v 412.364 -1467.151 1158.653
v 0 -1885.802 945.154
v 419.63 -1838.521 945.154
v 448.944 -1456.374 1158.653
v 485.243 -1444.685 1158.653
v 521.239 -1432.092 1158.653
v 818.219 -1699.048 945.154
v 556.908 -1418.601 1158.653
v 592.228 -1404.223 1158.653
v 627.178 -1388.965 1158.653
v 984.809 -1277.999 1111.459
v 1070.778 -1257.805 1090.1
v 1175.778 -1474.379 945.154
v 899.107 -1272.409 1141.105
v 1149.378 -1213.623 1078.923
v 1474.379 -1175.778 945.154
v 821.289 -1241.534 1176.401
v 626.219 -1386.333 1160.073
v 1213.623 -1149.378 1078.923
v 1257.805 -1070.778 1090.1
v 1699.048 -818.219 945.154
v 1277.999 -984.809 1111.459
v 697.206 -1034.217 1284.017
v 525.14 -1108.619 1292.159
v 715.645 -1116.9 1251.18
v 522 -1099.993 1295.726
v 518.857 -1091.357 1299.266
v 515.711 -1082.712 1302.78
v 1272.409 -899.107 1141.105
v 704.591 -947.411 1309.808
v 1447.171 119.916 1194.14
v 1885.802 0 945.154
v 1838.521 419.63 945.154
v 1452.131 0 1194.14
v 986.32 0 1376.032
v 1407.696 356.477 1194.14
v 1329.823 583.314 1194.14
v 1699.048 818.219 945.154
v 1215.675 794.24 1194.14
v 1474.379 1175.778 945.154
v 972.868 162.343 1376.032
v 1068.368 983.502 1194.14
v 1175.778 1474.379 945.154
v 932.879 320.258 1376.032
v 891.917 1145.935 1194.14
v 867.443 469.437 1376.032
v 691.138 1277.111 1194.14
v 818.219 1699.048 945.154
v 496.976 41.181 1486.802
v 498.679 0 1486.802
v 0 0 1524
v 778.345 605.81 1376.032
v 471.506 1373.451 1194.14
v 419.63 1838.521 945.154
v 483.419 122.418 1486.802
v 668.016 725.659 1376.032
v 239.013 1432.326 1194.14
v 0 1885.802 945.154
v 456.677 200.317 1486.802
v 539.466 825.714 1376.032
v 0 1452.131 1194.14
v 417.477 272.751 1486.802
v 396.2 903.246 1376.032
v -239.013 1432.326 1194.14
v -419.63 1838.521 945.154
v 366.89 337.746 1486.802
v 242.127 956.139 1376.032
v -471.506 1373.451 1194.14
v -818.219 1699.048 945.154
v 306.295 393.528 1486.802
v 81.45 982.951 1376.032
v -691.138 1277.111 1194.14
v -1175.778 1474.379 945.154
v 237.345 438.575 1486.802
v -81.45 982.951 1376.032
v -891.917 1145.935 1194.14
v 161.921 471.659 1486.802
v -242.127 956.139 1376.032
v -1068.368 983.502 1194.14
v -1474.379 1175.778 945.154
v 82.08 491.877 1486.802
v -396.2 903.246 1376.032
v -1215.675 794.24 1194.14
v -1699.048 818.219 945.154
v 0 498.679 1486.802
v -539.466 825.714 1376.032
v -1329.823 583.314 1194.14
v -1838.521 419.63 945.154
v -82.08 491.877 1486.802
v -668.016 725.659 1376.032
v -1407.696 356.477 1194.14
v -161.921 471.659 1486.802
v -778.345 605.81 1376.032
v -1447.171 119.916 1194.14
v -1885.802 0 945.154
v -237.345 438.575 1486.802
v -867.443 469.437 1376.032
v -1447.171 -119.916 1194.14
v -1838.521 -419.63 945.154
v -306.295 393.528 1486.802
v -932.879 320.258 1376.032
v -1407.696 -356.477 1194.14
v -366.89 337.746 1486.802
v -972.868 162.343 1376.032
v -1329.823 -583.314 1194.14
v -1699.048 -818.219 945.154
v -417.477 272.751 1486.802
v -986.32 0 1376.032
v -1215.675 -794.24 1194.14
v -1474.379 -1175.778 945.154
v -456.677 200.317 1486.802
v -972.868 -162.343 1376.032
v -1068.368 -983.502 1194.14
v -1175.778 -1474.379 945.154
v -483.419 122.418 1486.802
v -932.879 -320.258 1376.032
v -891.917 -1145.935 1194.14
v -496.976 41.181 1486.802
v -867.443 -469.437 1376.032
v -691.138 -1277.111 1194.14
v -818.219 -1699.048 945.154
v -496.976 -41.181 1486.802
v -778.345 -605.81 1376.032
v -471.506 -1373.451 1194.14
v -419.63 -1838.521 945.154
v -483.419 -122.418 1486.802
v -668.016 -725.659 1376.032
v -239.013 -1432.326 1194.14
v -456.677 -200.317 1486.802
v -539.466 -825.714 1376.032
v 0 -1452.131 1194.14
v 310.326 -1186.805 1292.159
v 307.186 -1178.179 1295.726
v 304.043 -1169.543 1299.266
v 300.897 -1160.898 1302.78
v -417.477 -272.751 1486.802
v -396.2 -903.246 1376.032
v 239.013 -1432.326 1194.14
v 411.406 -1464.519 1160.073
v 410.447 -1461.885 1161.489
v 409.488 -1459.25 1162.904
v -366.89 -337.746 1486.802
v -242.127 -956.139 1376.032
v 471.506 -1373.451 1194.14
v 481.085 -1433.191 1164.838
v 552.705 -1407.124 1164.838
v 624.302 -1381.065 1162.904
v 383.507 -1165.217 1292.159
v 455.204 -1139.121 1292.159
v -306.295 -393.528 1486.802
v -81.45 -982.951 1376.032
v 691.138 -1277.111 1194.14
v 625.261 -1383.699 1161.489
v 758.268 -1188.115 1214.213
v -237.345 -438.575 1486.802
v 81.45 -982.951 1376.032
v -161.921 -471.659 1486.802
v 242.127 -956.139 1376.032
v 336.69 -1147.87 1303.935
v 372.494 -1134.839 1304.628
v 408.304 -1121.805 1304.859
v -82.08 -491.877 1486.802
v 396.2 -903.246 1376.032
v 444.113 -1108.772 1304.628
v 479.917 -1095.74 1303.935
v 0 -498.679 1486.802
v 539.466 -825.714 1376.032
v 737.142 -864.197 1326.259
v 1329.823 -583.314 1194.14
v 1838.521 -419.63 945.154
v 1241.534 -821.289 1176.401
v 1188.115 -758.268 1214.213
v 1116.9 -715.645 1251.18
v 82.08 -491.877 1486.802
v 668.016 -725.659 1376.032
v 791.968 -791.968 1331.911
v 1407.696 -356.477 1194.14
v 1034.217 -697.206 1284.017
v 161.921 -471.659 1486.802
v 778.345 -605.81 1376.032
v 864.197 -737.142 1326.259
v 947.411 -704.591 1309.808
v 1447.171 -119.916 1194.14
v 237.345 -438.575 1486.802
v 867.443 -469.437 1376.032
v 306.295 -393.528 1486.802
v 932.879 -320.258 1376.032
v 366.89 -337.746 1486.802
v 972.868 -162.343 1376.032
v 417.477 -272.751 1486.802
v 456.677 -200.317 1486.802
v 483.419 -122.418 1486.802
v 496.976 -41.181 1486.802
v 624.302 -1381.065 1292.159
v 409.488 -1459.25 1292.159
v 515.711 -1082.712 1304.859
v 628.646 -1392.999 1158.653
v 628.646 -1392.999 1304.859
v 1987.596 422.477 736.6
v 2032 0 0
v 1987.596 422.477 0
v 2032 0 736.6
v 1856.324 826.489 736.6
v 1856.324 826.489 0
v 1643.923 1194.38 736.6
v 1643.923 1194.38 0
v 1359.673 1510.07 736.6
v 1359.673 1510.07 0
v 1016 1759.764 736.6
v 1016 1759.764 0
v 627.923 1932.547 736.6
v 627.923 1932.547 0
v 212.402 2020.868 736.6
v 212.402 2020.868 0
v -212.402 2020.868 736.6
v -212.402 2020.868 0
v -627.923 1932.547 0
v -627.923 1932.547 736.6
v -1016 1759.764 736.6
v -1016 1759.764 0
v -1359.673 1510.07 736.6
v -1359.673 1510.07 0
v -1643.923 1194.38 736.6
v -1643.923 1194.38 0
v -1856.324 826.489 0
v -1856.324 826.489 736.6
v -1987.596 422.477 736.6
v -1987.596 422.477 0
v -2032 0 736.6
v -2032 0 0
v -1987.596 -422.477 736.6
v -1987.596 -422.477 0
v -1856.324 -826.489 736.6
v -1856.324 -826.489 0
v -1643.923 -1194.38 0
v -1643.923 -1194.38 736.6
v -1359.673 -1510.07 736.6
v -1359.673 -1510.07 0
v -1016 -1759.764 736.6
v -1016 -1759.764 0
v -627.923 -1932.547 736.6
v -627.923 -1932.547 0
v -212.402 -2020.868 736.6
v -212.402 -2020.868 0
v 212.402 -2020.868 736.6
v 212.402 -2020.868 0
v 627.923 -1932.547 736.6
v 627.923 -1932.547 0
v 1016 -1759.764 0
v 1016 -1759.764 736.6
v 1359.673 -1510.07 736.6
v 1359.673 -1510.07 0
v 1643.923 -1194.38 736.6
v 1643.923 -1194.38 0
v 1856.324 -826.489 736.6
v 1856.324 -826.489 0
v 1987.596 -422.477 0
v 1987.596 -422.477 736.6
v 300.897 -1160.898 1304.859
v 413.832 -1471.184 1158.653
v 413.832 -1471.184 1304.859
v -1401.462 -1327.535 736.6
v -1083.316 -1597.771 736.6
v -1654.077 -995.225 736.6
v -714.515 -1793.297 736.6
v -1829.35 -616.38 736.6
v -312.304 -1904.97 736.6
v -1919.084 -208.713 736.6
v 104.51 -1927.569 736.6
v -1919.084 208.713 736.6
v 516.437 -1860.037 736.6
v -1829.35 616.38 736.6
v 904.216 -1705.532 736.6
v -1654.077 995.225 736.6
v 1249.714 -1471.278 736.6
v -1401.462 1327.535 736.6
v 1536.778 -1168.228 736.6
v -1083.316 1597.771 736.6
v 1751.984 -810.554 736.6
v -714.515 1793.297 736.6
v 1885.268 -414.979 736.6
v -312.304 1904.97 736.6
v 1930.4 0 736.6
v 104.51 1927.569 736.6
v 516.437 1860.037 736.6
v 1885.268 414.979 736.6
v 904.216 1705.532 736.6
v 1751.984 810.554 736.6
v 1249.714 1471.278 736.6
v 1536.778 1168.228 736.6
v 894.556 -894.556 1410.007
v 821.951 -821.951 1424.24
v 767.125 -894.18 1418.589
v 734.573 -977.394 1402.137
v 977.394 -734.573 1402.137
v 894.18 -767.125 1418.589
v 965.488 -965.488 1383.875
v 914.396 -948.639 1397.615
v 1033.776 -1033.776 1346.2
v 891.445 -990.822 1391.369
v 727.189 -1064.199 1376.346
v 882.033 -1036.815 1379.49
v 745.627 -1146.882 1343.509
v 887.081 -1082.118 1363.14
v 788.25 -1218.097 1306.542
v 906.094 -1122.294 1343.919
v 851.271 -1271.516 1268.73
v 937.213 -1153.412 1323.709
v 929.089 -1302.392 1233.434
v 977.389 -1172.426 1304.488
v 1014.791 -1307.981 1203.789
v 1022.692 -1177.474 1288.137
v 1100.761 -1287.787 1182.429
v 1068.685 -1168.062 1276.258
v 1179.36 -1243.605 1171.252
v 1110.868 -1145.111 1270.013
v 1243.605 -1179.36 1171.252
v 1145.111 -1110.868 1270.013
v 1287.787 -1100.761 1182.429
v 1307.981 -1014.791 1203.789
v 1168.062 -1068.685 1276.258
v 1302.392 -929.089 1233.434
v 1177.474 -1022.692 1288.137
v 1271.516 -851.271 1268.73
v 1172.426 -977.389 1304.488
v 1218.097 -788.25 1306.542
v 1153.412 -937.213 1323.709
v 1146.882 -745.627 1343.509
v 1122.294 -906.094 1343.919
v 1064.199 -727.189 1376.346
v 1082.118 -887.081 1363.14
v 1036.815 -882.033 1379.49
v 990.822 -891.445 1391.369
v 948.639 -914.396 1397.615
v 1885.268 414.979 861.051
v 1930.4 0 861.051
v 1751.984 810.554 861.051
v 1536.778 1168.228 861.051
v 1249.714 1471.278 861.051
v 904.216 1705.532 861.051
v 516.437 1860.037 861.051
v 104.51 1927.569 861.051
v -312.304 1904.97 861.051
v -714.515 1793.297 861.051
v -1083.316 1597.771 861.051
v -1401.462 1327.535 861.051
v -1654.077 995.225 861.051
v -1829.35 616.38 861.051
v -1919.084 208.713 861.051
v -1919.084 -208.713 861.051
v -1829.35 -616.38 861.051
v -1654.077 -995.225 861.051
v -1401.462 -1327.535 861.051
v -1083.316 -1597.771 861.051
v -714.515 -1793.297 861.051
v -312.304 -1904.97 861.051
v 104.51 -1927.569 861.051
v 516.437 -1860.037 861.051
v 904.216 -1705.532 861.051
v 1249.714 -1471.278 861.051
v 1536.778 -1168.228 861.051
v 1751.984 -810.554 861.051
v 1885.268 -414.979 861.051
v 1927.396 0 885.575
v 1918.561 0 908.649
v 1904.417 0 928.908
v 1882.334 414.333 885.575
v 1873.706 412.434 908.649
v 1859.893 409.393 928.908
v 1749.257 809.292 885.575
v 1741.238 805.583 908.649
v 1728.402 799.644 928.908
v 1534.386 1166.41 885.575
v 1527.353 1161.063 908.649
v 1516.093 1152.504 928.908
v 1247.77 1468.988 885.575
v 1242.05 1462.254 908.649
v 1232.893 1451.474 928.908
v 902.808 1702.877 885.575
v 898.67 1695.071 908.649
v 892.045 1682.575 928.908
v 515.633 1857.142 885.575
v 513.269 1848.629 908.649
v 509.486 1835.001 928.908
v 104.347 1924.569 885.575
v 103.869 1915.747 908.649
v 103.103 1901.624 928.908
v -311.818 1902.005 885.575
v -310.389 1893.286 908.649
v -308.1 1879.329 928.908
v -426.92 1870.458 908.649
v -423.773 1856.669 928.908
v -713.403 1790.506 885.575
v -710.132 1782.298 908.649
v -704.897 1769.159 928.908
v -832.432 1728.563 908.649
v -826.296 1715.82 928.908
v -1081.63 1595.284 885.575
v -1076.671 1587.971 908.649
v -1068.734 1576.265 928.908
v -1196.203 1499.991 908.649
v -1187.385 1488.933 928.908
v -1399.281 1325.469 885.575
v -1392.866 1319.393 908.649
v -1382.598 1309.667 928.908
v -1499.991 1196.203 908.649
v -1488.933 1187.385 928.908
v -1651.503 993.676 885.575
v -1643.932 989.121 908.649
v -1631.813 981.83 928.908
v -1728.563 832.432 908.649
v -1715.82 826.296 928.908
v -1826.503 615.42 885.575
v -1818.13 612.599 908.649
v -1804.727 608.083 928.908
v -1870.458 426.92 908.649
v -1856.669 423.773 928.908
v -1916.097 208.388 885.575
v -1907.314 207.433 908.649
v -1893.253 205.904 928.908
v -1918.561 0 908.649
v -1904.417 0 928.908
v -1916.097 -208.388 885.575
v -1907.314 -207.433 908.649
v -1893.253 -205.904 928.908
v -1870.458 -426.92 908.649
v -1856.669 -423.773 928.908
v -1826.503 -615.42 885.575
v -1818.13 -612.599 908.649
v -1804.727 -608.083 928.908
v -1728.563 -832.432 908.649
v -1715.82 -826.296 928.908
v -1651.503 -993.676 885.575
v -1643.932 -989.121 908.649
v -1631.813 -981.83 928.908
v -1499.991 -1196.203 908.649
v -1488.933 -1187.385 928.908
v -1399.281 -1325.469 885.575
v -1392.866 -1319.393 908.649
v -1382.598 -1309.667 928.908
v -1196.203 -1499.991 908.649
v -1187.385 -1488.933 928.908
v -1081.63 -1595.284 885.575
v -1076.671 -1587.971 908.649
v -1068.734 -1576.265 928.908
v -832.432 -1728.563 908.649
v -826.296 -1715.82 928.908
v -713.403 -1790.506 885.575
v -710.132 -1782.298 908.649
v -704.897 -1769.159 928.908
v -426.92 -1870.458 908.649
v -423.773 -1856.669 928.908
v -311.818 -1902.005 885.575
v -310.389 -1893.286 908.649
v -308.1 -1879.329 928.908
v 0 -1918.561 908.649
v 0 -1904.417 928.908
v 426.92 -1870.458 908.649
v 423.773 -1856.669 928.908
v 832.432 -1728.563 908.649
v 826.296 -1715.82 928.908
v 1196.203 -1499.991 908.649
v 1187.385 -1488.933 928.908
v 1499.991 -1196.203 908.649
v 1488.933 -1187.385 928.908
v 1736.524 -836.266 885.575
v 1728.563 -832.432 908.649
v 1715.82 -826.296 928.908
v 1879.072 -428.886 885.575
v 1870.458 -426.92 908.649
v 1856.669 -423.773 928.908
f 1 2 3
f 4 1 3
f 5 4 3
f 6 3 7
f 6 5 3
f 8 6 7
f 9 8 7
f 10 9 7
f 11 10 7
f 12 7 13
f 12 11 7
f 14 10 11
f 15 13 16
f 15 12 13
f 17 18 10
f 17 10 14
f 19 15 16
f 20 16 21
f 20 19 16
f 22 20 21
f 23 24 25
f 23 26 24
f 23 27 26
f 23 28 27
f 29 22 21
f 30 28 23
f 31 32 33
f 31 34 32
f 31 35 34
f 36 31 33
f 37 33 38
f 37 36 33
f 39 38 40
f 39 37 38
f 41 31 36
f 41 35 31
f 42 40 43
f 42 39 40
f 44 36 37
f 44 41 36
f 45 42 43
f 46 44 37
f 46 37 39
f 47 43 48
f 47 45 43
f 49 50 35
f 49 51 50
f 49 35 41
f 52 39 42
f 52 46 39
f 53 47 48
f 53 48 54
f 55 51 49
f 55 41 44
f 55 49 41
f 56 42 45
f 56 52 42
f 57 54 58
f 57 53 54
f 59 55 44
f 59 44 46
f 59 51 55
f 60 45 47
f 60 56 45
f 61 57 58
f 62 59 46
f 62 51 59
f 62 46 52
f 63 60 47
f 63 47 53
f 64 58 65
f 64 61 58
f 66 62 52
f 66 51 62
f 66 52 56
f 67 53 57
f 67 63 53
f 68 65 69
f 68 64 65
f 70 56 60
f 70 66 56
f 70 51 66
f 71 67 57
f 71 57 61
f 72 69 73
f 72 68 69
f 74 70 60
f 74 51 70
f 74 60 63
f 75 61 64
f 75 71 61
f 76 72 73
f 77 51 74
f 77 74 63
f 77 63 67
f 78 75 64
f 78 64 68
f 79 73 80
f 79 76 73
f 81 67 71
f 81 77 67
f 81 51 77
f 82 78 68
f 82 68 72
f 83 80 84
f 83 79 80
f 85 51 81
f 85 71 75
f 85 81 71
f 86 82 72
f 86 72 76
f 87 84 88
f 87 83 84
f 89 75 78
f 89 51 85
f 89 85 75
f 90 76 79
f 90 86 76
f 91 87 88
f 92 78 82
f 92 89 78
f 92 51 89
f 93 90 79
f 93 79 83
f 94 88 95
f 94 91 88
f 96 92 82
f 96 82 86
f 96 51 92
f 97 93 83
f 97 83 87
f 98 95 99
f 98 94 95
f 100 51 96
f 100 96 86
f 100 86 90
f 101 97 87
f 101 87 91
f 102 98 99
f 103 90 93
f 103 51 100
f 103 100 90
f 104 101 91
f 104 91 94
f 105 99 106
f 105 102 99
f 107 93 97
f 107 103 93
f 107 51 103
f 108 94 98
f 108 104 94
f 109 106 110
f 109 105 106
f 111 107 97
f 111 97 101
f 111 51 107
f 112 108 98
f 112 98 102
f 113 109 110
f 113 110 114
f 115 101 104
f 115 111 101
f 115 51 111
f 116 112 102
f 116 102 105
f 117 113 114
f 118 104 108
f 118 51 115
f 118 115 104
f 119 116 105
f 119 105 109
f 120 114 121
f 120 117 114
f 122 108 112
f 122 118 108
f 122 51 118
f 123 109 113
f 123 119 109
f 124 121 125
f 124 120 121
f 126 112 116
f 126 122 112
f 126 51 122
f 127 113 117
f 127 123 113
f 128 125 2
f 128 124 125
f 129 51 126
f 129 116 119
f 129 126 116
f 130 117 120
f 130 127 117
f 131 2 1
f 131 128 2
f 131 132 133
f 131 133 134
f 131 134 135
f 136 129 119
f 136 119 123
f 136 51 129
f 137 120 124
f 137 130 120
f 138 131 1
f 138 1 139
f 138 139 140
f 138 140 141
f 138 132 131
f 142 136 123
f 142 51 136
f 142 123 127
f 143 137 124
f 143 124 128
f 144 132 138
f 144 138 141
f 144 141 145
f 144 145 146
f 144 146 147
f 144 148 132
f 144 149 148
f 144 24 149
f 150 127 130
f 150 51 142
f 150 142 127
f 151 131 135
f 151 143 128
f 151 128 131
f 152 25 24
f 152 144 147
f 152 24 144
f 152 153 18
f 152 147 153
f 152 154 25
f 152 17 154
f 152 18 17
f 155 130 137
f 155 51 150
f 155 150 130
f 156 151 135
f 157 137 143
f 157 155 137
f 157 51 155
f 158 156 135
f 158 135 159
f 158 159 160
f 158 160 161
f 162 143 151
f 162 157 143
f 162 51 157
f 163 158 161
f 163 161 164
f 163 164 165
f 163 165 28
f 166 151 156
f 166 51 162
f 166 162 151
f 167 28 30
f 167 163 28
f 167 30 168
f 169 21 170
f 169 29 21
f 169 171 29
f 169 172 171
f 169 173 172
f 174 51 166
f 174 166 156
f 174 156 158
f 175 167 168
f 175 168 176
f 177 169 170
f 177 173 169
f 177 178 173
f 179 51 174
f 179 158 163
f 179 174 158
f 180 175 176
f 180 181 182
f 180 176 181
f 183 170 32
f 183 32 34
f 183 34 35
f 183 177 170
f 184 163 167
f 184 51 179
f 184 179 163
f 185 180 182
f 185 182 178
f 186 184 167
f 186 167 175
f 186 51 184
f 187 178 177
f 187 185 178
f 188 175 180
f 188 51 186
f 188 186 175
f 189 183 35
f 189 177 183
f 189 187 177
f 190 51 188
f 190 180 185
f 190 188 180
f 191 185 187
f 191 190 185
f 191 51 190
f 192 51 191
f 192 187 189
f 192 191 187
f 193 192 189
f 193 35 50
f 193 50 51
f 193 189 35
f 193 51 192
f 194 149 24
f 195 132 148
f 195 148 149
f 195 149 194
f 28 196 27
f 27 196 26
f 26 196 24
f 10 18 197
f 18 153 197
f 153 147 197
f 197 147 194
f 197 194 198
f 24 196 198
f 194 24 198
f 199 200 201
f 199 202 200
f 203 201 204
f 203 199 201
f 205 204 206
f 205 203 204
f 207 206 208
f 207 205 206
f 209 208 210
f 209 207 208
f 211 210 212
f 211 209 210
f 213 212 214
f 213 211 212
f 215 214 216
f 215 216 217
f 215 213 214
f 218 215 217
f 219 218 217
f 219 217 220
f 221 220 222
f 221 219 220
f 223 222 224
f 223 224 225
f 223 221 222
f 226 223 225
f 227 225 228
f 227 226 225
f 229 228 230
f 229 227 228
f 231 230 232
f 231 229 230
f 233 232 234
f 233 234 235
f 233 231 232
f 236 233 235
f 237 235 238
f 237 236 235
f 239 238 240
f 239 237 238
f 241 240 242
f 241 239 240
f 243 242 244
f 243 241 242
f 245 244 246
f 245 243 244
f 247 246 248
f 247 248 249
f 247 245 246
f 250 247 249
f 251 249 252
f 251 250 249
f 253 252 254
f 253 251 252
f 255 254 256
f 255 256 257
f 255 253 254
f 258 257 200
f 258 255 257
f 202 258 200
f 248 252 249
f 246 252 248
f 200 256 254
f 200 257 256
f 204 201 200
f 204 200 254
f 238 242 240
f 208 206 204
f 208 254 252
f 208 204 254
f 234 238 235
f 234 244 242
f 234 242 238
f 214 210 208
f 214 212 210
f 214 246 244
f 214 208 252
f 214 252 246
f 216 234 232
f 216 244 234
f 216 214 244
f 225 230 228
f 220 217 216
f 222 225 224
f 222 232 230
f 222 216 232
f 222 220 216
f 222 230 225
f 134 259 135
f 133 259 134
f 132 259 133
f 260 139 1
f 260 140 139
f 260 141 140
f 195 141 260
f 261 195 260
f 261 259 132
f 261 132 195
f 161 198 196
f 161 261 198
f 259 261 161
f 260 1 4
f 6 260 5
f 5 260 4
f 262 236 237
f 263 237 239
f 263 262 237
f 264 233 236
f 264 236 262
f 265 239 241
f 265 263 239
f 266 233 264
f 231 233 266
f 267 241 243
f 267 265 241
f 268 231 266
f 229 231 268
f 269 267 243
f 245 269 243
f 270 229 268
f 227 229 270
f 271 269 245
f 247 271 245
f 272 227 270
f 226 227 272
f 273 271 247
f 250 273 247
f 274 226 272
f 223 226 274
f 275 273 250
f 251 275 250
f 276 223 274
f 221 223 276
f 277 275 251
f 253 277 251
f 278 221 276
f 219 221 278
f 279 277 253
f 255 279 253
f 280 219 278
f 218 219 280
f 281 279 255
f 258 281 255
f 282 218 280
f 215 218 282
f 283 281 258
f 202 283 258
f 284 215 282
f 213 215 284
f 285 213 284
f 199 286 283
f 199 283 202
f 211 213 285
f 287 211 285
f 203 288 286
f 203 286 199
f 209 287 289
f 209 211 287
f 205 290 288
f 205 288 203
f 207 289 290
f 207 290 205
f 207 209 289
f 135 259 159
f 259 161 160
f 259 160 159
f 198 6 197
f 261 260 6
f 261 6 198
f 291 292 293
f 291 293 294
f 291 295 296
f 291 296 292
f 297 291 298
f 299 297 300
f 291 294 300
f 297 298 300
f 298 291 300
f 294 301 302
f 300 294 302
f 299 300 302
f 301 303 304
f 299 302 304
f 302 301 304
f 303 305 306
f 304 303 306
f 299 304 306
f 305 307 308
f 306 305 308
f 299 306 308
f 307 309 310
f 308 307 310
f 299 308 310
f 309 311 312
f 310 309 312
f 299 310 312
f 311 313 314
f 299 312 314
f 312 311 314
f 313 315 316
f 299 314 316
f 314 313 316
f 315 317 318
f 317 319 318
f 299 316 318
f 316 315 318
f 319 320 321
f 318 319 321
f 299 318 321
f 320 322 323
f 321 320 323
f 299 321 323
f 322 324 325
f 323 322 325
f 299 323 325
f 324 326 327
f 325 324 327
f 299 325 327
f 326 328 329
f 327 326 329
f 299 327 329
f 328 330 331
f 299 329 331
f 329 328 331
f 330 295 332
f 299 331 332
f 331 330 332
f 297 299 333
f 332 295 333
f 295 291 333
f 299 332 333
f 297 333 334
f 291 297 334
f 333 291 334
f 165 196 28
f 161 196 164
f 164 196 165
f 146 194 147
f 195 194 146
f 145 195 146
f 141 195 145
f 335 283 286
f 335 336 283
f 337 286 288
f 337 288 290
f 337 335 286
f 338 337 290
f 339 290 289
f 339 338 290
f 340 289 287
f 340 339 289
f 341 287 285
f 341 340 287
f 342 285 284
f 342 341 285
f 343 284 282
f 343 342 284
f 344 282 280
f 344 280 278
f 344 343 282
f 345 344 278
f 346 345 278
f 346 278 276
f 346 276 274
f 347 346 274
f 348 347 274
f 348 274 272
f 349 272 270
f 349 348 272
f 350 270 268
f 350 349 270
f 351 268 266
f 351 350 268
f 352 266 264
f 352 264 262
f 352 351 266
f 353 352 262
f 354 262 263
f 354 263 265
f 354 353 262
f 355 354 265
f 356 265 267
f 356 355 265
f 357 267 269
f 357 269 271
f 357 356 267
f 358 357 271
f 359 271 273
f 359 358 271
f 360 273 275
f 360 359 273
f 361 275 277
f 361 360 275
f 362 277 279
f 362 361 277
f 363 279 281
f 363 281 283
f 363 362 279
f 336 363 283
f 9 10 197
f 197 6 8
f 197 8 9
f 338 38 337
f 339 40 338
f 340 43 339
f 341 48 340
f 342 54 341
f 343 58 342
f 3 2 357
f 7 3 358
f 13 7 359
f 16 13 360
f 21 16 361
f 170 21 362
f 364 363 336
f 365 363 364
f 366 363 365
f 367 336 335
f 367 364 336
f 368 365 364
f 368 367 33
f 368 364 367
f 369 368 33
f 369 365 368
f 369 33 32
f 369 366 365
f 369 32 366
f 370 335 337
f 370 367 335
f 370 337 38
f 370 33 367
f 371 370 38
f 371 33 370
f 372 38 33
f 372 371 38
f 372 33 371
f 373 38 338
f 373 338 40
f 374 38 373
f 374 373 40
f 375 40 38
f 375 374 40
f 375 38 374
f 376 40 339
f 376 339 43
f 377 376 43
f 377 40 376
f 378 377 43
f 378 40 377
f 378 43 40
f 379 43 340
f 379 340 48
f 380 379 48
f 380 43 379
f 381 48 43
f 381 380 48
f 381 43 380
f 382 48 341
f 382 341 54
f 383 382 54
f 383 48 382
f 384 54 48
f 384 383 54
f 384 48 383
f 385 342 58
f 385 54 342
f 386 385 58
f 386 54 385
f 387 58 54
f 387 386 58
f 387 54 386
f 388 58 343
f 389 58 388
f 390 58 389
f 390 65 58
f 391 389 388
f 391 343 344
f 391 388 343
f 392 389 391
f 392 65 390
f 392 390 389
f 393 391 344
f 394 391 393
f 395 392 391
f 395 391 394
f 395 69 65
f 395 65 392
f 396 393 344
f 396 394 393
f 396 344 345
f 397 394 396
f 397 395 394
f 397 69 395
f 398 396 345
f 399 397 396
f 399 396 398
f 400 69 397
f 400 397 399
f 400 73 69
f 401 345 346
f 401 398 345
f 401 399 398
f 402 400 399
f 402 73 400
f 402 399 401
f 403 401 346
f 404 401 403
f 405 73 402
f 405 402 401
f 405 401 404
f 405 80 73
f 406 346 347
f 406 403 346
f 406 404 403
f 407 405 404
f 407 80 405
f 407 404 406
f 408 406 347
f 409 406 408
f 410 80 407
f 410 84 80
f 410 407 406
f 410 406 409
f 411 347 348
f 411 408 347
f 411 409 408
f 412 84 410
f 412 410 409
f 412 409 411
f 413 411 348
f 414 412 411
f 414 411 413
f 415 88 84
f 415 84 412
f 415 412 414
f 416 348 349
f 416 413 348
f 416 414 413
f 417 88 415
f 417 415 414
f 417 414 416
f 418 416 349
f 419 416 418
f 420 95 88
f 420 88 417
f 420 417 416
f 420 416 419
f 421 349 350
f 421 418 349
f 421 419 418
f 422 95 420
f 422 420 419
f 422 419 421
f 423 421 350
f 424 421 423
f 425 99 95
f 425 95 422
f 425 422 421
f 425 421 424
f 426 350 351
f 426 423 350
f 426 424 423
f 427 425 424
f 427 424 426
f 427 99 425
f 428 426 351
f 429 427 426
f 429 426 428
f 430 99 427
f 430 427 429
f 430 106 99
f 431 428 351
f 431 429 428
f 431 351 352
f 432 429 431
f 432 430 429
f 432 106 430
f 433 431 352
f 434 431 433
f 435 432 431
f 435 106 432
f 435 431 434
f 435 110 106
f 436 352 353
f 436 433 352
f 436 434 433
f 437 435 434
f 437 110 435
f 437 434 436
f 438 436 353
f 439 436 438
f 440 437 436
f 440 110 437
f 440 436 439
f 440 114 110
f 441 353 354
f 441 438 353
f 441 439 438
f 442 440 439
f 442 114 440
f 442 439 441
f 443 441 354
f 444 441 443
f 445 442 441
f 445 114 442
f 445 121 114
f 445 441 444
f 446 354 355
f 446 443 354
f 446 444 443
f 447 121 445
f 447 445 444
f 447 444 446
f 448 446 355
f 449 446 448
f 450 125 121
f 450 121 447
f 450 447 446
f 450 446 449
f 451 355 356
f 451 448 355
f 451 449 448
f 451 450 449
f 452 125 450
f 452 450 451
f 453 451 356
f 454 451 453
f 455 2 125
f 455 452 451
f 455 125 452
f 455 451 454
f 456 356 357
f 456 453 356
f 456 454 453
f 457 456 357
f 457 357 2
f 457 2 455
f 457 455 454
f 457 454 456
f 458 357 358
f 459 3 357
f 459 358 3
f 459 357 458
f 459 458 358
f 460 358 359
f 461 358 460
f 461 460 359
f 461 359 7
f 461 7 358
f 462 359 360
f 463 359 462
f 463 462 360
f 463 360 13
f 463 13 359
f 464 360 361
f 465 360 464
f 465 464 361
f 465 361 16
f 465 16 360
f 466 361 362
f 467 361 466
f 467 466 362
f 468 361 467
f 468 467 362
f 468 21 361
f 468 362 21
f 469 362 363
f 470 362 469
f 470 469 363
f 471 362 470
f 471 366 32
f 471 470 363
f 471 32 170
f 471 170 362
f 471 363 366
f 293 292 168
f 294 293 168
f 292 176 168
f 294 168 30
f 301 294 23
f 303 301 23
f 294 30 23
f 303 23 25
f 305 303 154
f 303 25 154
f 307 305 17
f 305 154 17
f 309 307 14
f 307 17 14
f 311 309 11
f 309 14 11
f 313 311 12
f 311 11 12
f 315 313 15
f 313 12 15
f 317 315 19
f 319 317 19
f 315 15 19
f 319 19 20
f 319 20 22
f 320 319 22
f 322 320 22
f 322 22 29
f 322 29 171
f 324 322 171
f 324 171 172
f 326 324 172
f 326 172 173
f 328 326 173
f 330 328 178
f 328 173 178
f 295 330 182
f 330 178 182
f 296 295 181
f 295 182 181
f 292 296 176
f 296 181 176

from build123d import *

# Parameters (mm, degrees)
F7_DEPTH = 114.3


with BuildPart() as f1:
    # F0 (on Front) → F1 (revolve)
    with BuildSketch(Plane.XZ):
        with BuildLine():
            ThreePointArc((1930.4, 861.0508346252), (1918.5605657782, 908.6491626543), (1885.8015584416, 945.1542372628))
            ThreePointArc((1885.8015584416, 945.1542372628), (986.3201730244, 1376.0316575992), (0, 1524))
            Line((0, 1524), (0, 0))
            Line((0, 0), (2032, 0))
            Line((2032, 0), (2032, 736.6))
            Line((2032, 736.6), (1930.4, 736.6))
            Line((1930.4, 736.6), (1930.4, 861.0508346252))
        make_face()
    revolve(axis=Axis((0, 0, 921.9542145729), (0, 0, 1)))

    # F3 (on line) → F4 (revolve)
    with BuildSketch(Plane(origin=(0, 0, 0), x_dir=(0.7071067812, -0.7071067812, 0), z_dir=(-0.7071067812, -0.7071067812, 0))):
        with BuildLine():
            Line((1162.4137766435, 1424.2400118495), (1120.0123857464, 1331.9108070983))
            Line((1120.0123857464, 1331.9108070983), (1397, 1204.7066344069))
            Line((1397, 1204.7066344069), (1461.9796076987, 1346.2))
            ThreePointArc((1461.9796076987, 1346.2), (1315.6327838789, 1398.4098510263), (1162.4137766435, 1424.2400118495))
        make_face()
    revolve(axis=Axis((1040.2953547308, -1040.2953547308, 1366.2770060086), (0.2951014866, -0.2951014866, 0.9087520153)))

    # F6 (on line) → F7 (join, symmetric)
    with BuildSketch(Plane(origin=(0, 0, 0), x_dir=(0.3420201433, -0.9396926208, 0), z_dir=(-0.9396926208, -0.3420201433, 0))):
        Polygon((1524, 1304.8592322184), (1193.8, 1304.8592322184), (1193.8, 1292.1592322184), (1511.3, 1292.1592322184), (1511.3, 1158.6534932249), (1524, 1158.6534932249), align=None)
    extrude(amount=F7_DEPTH, both=True)


solid = f1.part
